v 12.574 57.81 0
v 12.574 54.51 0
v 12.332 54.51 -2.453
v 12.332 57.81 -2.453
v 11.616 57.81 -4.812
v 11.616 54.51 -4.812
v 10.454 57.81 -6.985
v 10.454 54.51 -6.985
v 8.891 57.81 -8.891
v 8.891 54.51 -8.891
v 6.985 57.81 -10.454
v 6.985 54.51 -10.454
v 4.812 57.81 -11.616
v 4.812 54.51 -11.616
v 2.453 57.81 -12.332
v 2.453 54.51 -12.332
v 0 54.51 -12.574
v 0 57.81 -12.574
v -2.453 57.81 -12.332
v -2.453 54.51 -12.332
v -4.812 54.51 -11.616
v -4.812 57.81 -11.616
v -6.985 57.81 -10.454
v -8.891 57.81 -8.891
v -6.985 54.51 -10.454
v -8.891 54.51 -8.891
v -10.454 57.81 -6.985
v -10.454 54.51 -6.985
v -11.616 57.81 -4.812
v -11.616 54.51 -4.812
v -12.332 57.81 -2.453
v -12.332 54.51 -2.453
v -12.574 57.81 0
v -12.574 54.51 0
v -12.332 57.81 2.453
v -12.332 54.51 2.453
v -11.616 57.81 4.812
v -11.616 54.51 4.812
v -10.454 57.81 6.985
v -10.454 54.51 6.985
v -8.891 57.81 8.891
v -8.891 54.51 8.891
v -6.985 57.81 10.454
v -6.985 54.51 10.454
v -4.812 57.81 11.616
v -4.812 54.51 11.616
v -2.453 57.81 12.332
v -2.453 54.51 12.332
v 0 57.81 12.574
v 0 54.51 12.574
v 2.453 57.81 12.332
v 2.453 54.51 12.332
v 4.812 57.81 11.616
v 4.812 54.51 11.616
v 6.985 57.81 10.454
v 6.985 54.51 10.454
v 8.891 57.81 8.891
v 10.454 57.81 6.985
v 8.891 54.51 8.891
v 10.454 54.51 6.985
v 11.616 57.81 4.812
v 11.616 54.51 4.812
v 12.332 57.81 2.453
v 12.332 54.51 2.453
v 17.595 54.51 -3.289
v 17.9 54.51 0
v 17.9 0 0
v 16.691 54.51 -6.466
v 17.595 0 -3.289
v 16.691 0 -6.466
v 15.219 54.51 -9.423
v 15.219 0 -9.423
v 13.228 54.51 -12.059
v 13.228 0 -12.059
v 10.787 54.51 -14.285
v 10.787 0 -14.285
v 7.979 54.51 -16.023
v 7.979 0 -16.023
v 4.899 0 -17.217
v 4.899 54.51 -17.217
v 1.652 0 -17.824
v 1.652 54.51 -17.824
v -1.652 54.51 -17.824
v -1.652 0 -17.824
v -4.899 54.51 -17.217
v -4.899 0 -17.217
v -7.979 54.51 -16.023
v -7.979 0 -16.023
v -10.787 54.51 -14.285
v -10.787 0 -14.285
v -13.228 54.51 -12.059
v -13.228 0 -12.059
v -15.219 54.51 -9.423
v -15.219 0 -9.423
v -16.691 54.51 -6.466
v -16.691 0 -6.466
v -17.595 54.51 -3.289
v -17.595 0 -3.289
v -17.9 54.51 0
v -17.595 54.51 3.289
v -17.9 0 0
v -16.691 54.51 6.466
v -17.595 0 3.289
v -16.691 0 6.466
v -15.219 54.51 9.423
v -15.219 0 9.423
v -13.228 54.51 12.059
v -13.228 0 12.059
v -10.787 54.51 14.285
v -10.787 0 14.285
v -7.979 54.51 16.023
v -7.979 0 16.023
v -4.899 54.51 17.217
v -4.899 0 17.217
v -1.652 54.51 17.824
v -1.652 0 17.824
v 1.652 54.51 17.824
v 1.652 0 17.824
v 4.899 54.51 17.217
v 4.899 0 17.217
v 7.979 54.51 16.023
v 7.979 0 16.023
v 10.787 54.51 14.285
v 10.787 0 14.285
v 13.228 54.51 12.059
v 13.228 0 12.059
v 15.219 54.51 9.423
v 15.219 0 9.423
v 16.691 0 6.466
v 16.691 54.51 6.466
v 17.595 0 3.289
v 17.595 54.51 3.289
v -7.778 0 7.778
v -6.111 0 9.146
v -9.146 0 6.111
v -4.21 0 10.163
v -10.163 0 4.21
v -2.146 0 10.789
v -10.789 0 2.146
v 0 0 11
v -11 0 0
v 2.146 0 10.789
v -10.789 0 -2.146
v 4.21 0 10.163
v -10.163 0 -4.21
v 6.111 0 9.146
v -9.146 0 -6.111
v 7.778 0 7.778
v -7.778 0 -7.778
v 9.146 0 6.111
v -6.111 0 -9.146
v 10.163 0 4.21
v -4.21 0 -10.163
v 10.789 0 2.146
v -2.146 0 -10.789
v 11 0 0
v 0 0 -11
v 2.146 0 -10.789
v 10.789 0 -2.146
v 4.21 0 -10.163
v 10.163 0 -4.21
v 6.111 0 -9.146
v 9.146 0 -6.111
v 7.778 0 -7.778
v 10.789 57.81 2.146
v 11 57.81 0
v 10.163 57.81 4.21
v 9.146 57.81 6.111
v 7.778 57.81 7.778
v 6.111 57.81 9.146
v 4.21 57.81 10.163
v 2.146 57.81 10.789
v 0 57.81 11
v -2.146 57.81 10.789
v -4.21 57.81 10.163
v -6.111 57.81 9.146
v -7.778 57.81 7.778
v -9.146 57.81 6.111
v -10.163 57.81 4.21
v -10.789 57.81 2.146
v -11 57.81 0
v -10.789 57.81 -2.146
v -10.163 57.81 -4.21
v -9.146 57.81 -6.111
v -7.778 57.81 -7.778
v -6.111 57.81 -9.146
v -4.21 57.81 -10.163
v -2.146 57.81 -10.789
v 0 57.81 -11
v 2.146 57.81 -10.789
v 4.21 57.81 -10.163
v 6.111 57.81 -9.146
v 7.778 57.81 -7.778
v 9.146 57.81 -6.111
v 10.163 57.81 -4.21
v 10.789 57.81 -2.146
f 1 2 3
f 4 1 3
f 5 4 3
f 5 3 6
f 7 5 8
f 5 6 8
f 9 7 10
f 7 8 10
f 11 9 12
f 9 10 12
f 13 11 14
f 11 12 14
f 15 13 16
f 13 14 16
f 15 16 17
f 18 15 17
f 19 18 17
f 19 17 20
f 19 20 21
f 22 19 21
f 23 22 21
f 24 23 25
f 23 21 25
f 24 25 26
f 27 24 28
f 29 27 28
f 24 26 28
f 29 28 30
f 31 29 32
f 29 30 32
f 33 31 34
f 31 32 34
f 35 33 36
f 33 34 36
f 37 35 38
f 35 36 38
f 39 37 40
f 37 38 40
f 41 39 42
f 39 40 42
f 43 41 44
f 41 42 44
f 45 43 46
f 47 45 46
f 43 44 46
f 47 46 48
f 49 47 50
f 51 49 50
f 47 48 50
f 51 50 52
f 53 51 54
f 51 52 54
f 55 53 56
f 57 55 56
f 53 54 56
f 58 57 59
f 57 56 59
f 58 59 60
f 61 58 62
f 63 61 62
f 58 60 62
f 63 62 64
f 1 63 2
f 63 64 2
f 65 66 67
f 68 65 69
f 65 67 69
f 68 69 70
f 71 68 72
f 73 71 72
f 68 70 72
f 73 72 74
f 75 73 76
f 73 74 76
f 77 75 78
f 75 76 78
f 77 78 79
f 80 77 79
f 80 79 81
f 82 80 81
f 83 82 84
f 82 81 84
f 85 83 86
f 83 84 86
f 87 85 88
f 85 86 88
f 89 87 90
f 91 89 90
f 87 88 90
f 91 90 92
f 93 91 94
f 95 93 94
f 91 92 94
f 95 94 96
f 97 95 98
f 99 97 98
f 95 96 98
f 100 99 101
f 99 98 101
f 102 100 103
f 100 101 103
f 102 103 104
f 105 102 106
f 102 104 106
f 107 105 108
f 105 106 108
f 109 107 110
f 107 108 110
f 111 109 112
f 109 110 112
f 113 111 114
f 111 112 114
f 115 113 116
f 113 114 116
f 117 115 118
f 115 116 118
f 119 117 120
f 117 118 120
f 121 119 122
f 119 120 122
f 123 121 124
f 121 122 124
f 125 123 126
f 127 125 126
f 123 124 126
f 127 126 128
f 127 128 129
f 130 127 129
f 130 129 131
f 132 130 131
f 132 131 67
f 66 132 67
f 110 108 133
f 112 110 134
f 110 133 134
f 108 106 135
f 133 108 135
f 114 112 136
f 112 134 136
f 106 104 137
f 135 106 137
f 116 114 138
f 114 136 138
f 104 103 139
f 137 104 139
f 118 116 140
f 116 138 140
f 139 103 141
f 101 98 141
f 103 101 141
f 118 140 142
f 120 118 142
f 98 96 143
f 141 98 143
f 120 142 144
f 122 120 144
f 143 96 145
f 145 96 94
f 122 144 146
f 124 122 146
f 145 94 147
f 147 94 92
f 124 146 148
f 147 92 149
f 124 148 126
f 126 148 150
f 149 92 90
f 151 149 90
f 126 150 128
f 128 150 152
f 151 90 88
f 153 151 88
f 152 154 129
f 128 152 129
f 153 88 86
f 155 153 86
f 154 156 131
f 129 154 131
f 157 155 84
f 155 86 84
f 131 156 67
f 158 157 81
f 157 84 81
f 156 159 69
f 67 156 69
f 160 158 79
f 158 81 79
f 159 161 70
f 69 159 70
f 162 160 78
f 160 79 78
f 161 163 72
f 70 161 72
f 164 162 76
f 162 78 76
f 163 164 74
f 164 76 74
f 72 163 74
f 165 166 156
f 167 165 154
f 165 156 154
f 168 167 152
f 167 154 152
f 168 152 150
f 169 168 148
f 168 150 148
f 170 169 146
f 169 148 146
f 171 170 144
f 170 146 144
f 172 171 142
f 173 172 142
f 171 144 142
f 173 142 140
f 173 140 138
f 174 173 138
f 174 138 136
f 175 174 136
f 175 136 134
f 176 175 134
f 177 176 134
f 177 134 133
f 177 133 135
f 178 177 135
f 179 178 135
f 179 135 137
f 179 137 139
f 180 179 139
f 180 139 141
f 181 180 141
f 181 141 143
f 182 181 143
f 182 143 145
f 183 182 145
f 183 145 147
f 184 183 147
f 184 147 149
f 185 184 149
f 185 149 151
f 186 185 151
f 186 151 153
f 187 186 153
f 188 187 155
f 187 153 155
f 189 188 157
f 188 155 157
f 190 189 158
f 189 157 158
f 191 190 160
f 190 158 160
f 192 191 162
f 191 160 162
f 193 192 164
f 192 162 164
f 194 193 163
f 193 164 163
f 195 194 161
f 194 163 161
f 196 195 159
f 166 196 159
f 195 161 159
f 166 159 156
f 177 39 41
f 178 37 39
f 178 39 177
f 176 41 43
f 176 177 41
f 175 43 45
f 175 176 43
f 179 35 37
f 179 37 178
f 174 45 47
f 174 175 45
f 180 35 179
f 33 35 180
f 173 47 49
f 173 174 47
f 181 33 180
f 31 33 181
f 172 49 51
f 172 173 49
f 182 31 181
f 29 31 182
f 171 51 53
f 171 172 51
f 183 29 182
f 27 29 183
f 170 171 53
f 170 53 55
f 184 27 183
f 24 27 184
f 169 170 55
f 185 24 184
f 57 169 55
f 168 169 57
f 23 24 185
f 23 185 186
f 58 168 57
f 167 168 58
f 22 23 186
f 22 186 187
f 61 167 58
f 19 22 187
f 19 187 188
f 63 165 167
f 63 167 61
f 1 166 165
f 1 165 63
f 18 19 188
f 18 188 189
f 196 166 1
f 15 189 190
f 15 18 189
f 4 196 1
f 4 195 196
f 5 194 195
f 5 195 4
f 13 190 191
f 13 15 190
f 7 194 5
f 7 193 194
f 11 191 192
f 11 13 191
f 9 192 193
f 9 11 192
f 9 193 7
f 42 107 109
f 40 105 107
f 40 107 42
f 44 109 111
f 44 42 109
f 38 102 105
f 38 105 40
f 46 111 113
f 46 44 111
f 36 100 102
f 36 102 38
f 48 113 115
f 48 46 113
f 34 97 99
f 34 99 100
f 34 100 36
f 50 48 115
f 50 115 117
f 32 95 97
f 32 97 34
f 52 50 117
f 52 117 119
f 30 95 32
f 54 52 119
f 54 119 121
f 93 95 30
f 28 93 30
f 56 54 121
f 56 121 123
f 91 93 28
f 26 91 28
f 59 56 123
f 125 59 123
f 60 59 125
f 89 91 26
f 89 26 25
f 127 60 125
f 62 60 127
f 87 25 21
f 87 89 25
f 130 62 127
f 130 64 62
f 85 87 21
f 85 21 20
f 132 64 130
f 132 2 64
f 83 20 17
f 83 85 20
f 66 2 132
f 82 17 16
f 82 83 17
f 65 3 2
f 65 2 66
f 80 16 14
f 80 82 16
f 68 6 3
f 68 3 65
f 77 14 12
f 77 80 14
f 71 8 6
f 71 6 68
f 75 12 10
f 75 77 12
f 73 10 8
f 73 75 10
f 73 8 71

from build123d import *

# Parameters (mm, degrees)
SKETCH1_R           = 17.9
BOSS_EXTRUDE1_DEPTH = 54.51
SKETCH2_R           = 12.5735
BOSS_EXTRUDE2_DEPTH = 3.3
SKETCH4_R           = 11
CUT_EXTRUDE2_DEPTH  = 59.3


with BuildPart() as part:
    # Sketch1 → Boss-Extrude1 (new body)
    with BuildSketch(Plane(origin=(0, 0, 0), x_dir=(1, 0, 0), z_dir=(0, 1, 0))):
        Circle(SKETCH1_R)
    extrude(amount=BOSS_EXTRUDE1_DEPTH)

    # Sketch2 → Boss-Extrude2 (add)
    with BuildSketch(Plane(origin=(0, 54.51, 0), x_dir=(1, 0, 0), z_dir=(0, 1, 0))):
        Circle(SKETCH2_R)
    extrude(amount=BOSS_EXTRUDE2_DEPTH)

    # Sketch4 → Cut-Extrude2 (cut)
    with BuildSketch(Plane.XZ):
        Circle(SKETCH4_R)
    extrude(amount=-CUT_EXTRUDE2_DEPTH, mode=Mode.SUBTRACT)


solid = part.part
